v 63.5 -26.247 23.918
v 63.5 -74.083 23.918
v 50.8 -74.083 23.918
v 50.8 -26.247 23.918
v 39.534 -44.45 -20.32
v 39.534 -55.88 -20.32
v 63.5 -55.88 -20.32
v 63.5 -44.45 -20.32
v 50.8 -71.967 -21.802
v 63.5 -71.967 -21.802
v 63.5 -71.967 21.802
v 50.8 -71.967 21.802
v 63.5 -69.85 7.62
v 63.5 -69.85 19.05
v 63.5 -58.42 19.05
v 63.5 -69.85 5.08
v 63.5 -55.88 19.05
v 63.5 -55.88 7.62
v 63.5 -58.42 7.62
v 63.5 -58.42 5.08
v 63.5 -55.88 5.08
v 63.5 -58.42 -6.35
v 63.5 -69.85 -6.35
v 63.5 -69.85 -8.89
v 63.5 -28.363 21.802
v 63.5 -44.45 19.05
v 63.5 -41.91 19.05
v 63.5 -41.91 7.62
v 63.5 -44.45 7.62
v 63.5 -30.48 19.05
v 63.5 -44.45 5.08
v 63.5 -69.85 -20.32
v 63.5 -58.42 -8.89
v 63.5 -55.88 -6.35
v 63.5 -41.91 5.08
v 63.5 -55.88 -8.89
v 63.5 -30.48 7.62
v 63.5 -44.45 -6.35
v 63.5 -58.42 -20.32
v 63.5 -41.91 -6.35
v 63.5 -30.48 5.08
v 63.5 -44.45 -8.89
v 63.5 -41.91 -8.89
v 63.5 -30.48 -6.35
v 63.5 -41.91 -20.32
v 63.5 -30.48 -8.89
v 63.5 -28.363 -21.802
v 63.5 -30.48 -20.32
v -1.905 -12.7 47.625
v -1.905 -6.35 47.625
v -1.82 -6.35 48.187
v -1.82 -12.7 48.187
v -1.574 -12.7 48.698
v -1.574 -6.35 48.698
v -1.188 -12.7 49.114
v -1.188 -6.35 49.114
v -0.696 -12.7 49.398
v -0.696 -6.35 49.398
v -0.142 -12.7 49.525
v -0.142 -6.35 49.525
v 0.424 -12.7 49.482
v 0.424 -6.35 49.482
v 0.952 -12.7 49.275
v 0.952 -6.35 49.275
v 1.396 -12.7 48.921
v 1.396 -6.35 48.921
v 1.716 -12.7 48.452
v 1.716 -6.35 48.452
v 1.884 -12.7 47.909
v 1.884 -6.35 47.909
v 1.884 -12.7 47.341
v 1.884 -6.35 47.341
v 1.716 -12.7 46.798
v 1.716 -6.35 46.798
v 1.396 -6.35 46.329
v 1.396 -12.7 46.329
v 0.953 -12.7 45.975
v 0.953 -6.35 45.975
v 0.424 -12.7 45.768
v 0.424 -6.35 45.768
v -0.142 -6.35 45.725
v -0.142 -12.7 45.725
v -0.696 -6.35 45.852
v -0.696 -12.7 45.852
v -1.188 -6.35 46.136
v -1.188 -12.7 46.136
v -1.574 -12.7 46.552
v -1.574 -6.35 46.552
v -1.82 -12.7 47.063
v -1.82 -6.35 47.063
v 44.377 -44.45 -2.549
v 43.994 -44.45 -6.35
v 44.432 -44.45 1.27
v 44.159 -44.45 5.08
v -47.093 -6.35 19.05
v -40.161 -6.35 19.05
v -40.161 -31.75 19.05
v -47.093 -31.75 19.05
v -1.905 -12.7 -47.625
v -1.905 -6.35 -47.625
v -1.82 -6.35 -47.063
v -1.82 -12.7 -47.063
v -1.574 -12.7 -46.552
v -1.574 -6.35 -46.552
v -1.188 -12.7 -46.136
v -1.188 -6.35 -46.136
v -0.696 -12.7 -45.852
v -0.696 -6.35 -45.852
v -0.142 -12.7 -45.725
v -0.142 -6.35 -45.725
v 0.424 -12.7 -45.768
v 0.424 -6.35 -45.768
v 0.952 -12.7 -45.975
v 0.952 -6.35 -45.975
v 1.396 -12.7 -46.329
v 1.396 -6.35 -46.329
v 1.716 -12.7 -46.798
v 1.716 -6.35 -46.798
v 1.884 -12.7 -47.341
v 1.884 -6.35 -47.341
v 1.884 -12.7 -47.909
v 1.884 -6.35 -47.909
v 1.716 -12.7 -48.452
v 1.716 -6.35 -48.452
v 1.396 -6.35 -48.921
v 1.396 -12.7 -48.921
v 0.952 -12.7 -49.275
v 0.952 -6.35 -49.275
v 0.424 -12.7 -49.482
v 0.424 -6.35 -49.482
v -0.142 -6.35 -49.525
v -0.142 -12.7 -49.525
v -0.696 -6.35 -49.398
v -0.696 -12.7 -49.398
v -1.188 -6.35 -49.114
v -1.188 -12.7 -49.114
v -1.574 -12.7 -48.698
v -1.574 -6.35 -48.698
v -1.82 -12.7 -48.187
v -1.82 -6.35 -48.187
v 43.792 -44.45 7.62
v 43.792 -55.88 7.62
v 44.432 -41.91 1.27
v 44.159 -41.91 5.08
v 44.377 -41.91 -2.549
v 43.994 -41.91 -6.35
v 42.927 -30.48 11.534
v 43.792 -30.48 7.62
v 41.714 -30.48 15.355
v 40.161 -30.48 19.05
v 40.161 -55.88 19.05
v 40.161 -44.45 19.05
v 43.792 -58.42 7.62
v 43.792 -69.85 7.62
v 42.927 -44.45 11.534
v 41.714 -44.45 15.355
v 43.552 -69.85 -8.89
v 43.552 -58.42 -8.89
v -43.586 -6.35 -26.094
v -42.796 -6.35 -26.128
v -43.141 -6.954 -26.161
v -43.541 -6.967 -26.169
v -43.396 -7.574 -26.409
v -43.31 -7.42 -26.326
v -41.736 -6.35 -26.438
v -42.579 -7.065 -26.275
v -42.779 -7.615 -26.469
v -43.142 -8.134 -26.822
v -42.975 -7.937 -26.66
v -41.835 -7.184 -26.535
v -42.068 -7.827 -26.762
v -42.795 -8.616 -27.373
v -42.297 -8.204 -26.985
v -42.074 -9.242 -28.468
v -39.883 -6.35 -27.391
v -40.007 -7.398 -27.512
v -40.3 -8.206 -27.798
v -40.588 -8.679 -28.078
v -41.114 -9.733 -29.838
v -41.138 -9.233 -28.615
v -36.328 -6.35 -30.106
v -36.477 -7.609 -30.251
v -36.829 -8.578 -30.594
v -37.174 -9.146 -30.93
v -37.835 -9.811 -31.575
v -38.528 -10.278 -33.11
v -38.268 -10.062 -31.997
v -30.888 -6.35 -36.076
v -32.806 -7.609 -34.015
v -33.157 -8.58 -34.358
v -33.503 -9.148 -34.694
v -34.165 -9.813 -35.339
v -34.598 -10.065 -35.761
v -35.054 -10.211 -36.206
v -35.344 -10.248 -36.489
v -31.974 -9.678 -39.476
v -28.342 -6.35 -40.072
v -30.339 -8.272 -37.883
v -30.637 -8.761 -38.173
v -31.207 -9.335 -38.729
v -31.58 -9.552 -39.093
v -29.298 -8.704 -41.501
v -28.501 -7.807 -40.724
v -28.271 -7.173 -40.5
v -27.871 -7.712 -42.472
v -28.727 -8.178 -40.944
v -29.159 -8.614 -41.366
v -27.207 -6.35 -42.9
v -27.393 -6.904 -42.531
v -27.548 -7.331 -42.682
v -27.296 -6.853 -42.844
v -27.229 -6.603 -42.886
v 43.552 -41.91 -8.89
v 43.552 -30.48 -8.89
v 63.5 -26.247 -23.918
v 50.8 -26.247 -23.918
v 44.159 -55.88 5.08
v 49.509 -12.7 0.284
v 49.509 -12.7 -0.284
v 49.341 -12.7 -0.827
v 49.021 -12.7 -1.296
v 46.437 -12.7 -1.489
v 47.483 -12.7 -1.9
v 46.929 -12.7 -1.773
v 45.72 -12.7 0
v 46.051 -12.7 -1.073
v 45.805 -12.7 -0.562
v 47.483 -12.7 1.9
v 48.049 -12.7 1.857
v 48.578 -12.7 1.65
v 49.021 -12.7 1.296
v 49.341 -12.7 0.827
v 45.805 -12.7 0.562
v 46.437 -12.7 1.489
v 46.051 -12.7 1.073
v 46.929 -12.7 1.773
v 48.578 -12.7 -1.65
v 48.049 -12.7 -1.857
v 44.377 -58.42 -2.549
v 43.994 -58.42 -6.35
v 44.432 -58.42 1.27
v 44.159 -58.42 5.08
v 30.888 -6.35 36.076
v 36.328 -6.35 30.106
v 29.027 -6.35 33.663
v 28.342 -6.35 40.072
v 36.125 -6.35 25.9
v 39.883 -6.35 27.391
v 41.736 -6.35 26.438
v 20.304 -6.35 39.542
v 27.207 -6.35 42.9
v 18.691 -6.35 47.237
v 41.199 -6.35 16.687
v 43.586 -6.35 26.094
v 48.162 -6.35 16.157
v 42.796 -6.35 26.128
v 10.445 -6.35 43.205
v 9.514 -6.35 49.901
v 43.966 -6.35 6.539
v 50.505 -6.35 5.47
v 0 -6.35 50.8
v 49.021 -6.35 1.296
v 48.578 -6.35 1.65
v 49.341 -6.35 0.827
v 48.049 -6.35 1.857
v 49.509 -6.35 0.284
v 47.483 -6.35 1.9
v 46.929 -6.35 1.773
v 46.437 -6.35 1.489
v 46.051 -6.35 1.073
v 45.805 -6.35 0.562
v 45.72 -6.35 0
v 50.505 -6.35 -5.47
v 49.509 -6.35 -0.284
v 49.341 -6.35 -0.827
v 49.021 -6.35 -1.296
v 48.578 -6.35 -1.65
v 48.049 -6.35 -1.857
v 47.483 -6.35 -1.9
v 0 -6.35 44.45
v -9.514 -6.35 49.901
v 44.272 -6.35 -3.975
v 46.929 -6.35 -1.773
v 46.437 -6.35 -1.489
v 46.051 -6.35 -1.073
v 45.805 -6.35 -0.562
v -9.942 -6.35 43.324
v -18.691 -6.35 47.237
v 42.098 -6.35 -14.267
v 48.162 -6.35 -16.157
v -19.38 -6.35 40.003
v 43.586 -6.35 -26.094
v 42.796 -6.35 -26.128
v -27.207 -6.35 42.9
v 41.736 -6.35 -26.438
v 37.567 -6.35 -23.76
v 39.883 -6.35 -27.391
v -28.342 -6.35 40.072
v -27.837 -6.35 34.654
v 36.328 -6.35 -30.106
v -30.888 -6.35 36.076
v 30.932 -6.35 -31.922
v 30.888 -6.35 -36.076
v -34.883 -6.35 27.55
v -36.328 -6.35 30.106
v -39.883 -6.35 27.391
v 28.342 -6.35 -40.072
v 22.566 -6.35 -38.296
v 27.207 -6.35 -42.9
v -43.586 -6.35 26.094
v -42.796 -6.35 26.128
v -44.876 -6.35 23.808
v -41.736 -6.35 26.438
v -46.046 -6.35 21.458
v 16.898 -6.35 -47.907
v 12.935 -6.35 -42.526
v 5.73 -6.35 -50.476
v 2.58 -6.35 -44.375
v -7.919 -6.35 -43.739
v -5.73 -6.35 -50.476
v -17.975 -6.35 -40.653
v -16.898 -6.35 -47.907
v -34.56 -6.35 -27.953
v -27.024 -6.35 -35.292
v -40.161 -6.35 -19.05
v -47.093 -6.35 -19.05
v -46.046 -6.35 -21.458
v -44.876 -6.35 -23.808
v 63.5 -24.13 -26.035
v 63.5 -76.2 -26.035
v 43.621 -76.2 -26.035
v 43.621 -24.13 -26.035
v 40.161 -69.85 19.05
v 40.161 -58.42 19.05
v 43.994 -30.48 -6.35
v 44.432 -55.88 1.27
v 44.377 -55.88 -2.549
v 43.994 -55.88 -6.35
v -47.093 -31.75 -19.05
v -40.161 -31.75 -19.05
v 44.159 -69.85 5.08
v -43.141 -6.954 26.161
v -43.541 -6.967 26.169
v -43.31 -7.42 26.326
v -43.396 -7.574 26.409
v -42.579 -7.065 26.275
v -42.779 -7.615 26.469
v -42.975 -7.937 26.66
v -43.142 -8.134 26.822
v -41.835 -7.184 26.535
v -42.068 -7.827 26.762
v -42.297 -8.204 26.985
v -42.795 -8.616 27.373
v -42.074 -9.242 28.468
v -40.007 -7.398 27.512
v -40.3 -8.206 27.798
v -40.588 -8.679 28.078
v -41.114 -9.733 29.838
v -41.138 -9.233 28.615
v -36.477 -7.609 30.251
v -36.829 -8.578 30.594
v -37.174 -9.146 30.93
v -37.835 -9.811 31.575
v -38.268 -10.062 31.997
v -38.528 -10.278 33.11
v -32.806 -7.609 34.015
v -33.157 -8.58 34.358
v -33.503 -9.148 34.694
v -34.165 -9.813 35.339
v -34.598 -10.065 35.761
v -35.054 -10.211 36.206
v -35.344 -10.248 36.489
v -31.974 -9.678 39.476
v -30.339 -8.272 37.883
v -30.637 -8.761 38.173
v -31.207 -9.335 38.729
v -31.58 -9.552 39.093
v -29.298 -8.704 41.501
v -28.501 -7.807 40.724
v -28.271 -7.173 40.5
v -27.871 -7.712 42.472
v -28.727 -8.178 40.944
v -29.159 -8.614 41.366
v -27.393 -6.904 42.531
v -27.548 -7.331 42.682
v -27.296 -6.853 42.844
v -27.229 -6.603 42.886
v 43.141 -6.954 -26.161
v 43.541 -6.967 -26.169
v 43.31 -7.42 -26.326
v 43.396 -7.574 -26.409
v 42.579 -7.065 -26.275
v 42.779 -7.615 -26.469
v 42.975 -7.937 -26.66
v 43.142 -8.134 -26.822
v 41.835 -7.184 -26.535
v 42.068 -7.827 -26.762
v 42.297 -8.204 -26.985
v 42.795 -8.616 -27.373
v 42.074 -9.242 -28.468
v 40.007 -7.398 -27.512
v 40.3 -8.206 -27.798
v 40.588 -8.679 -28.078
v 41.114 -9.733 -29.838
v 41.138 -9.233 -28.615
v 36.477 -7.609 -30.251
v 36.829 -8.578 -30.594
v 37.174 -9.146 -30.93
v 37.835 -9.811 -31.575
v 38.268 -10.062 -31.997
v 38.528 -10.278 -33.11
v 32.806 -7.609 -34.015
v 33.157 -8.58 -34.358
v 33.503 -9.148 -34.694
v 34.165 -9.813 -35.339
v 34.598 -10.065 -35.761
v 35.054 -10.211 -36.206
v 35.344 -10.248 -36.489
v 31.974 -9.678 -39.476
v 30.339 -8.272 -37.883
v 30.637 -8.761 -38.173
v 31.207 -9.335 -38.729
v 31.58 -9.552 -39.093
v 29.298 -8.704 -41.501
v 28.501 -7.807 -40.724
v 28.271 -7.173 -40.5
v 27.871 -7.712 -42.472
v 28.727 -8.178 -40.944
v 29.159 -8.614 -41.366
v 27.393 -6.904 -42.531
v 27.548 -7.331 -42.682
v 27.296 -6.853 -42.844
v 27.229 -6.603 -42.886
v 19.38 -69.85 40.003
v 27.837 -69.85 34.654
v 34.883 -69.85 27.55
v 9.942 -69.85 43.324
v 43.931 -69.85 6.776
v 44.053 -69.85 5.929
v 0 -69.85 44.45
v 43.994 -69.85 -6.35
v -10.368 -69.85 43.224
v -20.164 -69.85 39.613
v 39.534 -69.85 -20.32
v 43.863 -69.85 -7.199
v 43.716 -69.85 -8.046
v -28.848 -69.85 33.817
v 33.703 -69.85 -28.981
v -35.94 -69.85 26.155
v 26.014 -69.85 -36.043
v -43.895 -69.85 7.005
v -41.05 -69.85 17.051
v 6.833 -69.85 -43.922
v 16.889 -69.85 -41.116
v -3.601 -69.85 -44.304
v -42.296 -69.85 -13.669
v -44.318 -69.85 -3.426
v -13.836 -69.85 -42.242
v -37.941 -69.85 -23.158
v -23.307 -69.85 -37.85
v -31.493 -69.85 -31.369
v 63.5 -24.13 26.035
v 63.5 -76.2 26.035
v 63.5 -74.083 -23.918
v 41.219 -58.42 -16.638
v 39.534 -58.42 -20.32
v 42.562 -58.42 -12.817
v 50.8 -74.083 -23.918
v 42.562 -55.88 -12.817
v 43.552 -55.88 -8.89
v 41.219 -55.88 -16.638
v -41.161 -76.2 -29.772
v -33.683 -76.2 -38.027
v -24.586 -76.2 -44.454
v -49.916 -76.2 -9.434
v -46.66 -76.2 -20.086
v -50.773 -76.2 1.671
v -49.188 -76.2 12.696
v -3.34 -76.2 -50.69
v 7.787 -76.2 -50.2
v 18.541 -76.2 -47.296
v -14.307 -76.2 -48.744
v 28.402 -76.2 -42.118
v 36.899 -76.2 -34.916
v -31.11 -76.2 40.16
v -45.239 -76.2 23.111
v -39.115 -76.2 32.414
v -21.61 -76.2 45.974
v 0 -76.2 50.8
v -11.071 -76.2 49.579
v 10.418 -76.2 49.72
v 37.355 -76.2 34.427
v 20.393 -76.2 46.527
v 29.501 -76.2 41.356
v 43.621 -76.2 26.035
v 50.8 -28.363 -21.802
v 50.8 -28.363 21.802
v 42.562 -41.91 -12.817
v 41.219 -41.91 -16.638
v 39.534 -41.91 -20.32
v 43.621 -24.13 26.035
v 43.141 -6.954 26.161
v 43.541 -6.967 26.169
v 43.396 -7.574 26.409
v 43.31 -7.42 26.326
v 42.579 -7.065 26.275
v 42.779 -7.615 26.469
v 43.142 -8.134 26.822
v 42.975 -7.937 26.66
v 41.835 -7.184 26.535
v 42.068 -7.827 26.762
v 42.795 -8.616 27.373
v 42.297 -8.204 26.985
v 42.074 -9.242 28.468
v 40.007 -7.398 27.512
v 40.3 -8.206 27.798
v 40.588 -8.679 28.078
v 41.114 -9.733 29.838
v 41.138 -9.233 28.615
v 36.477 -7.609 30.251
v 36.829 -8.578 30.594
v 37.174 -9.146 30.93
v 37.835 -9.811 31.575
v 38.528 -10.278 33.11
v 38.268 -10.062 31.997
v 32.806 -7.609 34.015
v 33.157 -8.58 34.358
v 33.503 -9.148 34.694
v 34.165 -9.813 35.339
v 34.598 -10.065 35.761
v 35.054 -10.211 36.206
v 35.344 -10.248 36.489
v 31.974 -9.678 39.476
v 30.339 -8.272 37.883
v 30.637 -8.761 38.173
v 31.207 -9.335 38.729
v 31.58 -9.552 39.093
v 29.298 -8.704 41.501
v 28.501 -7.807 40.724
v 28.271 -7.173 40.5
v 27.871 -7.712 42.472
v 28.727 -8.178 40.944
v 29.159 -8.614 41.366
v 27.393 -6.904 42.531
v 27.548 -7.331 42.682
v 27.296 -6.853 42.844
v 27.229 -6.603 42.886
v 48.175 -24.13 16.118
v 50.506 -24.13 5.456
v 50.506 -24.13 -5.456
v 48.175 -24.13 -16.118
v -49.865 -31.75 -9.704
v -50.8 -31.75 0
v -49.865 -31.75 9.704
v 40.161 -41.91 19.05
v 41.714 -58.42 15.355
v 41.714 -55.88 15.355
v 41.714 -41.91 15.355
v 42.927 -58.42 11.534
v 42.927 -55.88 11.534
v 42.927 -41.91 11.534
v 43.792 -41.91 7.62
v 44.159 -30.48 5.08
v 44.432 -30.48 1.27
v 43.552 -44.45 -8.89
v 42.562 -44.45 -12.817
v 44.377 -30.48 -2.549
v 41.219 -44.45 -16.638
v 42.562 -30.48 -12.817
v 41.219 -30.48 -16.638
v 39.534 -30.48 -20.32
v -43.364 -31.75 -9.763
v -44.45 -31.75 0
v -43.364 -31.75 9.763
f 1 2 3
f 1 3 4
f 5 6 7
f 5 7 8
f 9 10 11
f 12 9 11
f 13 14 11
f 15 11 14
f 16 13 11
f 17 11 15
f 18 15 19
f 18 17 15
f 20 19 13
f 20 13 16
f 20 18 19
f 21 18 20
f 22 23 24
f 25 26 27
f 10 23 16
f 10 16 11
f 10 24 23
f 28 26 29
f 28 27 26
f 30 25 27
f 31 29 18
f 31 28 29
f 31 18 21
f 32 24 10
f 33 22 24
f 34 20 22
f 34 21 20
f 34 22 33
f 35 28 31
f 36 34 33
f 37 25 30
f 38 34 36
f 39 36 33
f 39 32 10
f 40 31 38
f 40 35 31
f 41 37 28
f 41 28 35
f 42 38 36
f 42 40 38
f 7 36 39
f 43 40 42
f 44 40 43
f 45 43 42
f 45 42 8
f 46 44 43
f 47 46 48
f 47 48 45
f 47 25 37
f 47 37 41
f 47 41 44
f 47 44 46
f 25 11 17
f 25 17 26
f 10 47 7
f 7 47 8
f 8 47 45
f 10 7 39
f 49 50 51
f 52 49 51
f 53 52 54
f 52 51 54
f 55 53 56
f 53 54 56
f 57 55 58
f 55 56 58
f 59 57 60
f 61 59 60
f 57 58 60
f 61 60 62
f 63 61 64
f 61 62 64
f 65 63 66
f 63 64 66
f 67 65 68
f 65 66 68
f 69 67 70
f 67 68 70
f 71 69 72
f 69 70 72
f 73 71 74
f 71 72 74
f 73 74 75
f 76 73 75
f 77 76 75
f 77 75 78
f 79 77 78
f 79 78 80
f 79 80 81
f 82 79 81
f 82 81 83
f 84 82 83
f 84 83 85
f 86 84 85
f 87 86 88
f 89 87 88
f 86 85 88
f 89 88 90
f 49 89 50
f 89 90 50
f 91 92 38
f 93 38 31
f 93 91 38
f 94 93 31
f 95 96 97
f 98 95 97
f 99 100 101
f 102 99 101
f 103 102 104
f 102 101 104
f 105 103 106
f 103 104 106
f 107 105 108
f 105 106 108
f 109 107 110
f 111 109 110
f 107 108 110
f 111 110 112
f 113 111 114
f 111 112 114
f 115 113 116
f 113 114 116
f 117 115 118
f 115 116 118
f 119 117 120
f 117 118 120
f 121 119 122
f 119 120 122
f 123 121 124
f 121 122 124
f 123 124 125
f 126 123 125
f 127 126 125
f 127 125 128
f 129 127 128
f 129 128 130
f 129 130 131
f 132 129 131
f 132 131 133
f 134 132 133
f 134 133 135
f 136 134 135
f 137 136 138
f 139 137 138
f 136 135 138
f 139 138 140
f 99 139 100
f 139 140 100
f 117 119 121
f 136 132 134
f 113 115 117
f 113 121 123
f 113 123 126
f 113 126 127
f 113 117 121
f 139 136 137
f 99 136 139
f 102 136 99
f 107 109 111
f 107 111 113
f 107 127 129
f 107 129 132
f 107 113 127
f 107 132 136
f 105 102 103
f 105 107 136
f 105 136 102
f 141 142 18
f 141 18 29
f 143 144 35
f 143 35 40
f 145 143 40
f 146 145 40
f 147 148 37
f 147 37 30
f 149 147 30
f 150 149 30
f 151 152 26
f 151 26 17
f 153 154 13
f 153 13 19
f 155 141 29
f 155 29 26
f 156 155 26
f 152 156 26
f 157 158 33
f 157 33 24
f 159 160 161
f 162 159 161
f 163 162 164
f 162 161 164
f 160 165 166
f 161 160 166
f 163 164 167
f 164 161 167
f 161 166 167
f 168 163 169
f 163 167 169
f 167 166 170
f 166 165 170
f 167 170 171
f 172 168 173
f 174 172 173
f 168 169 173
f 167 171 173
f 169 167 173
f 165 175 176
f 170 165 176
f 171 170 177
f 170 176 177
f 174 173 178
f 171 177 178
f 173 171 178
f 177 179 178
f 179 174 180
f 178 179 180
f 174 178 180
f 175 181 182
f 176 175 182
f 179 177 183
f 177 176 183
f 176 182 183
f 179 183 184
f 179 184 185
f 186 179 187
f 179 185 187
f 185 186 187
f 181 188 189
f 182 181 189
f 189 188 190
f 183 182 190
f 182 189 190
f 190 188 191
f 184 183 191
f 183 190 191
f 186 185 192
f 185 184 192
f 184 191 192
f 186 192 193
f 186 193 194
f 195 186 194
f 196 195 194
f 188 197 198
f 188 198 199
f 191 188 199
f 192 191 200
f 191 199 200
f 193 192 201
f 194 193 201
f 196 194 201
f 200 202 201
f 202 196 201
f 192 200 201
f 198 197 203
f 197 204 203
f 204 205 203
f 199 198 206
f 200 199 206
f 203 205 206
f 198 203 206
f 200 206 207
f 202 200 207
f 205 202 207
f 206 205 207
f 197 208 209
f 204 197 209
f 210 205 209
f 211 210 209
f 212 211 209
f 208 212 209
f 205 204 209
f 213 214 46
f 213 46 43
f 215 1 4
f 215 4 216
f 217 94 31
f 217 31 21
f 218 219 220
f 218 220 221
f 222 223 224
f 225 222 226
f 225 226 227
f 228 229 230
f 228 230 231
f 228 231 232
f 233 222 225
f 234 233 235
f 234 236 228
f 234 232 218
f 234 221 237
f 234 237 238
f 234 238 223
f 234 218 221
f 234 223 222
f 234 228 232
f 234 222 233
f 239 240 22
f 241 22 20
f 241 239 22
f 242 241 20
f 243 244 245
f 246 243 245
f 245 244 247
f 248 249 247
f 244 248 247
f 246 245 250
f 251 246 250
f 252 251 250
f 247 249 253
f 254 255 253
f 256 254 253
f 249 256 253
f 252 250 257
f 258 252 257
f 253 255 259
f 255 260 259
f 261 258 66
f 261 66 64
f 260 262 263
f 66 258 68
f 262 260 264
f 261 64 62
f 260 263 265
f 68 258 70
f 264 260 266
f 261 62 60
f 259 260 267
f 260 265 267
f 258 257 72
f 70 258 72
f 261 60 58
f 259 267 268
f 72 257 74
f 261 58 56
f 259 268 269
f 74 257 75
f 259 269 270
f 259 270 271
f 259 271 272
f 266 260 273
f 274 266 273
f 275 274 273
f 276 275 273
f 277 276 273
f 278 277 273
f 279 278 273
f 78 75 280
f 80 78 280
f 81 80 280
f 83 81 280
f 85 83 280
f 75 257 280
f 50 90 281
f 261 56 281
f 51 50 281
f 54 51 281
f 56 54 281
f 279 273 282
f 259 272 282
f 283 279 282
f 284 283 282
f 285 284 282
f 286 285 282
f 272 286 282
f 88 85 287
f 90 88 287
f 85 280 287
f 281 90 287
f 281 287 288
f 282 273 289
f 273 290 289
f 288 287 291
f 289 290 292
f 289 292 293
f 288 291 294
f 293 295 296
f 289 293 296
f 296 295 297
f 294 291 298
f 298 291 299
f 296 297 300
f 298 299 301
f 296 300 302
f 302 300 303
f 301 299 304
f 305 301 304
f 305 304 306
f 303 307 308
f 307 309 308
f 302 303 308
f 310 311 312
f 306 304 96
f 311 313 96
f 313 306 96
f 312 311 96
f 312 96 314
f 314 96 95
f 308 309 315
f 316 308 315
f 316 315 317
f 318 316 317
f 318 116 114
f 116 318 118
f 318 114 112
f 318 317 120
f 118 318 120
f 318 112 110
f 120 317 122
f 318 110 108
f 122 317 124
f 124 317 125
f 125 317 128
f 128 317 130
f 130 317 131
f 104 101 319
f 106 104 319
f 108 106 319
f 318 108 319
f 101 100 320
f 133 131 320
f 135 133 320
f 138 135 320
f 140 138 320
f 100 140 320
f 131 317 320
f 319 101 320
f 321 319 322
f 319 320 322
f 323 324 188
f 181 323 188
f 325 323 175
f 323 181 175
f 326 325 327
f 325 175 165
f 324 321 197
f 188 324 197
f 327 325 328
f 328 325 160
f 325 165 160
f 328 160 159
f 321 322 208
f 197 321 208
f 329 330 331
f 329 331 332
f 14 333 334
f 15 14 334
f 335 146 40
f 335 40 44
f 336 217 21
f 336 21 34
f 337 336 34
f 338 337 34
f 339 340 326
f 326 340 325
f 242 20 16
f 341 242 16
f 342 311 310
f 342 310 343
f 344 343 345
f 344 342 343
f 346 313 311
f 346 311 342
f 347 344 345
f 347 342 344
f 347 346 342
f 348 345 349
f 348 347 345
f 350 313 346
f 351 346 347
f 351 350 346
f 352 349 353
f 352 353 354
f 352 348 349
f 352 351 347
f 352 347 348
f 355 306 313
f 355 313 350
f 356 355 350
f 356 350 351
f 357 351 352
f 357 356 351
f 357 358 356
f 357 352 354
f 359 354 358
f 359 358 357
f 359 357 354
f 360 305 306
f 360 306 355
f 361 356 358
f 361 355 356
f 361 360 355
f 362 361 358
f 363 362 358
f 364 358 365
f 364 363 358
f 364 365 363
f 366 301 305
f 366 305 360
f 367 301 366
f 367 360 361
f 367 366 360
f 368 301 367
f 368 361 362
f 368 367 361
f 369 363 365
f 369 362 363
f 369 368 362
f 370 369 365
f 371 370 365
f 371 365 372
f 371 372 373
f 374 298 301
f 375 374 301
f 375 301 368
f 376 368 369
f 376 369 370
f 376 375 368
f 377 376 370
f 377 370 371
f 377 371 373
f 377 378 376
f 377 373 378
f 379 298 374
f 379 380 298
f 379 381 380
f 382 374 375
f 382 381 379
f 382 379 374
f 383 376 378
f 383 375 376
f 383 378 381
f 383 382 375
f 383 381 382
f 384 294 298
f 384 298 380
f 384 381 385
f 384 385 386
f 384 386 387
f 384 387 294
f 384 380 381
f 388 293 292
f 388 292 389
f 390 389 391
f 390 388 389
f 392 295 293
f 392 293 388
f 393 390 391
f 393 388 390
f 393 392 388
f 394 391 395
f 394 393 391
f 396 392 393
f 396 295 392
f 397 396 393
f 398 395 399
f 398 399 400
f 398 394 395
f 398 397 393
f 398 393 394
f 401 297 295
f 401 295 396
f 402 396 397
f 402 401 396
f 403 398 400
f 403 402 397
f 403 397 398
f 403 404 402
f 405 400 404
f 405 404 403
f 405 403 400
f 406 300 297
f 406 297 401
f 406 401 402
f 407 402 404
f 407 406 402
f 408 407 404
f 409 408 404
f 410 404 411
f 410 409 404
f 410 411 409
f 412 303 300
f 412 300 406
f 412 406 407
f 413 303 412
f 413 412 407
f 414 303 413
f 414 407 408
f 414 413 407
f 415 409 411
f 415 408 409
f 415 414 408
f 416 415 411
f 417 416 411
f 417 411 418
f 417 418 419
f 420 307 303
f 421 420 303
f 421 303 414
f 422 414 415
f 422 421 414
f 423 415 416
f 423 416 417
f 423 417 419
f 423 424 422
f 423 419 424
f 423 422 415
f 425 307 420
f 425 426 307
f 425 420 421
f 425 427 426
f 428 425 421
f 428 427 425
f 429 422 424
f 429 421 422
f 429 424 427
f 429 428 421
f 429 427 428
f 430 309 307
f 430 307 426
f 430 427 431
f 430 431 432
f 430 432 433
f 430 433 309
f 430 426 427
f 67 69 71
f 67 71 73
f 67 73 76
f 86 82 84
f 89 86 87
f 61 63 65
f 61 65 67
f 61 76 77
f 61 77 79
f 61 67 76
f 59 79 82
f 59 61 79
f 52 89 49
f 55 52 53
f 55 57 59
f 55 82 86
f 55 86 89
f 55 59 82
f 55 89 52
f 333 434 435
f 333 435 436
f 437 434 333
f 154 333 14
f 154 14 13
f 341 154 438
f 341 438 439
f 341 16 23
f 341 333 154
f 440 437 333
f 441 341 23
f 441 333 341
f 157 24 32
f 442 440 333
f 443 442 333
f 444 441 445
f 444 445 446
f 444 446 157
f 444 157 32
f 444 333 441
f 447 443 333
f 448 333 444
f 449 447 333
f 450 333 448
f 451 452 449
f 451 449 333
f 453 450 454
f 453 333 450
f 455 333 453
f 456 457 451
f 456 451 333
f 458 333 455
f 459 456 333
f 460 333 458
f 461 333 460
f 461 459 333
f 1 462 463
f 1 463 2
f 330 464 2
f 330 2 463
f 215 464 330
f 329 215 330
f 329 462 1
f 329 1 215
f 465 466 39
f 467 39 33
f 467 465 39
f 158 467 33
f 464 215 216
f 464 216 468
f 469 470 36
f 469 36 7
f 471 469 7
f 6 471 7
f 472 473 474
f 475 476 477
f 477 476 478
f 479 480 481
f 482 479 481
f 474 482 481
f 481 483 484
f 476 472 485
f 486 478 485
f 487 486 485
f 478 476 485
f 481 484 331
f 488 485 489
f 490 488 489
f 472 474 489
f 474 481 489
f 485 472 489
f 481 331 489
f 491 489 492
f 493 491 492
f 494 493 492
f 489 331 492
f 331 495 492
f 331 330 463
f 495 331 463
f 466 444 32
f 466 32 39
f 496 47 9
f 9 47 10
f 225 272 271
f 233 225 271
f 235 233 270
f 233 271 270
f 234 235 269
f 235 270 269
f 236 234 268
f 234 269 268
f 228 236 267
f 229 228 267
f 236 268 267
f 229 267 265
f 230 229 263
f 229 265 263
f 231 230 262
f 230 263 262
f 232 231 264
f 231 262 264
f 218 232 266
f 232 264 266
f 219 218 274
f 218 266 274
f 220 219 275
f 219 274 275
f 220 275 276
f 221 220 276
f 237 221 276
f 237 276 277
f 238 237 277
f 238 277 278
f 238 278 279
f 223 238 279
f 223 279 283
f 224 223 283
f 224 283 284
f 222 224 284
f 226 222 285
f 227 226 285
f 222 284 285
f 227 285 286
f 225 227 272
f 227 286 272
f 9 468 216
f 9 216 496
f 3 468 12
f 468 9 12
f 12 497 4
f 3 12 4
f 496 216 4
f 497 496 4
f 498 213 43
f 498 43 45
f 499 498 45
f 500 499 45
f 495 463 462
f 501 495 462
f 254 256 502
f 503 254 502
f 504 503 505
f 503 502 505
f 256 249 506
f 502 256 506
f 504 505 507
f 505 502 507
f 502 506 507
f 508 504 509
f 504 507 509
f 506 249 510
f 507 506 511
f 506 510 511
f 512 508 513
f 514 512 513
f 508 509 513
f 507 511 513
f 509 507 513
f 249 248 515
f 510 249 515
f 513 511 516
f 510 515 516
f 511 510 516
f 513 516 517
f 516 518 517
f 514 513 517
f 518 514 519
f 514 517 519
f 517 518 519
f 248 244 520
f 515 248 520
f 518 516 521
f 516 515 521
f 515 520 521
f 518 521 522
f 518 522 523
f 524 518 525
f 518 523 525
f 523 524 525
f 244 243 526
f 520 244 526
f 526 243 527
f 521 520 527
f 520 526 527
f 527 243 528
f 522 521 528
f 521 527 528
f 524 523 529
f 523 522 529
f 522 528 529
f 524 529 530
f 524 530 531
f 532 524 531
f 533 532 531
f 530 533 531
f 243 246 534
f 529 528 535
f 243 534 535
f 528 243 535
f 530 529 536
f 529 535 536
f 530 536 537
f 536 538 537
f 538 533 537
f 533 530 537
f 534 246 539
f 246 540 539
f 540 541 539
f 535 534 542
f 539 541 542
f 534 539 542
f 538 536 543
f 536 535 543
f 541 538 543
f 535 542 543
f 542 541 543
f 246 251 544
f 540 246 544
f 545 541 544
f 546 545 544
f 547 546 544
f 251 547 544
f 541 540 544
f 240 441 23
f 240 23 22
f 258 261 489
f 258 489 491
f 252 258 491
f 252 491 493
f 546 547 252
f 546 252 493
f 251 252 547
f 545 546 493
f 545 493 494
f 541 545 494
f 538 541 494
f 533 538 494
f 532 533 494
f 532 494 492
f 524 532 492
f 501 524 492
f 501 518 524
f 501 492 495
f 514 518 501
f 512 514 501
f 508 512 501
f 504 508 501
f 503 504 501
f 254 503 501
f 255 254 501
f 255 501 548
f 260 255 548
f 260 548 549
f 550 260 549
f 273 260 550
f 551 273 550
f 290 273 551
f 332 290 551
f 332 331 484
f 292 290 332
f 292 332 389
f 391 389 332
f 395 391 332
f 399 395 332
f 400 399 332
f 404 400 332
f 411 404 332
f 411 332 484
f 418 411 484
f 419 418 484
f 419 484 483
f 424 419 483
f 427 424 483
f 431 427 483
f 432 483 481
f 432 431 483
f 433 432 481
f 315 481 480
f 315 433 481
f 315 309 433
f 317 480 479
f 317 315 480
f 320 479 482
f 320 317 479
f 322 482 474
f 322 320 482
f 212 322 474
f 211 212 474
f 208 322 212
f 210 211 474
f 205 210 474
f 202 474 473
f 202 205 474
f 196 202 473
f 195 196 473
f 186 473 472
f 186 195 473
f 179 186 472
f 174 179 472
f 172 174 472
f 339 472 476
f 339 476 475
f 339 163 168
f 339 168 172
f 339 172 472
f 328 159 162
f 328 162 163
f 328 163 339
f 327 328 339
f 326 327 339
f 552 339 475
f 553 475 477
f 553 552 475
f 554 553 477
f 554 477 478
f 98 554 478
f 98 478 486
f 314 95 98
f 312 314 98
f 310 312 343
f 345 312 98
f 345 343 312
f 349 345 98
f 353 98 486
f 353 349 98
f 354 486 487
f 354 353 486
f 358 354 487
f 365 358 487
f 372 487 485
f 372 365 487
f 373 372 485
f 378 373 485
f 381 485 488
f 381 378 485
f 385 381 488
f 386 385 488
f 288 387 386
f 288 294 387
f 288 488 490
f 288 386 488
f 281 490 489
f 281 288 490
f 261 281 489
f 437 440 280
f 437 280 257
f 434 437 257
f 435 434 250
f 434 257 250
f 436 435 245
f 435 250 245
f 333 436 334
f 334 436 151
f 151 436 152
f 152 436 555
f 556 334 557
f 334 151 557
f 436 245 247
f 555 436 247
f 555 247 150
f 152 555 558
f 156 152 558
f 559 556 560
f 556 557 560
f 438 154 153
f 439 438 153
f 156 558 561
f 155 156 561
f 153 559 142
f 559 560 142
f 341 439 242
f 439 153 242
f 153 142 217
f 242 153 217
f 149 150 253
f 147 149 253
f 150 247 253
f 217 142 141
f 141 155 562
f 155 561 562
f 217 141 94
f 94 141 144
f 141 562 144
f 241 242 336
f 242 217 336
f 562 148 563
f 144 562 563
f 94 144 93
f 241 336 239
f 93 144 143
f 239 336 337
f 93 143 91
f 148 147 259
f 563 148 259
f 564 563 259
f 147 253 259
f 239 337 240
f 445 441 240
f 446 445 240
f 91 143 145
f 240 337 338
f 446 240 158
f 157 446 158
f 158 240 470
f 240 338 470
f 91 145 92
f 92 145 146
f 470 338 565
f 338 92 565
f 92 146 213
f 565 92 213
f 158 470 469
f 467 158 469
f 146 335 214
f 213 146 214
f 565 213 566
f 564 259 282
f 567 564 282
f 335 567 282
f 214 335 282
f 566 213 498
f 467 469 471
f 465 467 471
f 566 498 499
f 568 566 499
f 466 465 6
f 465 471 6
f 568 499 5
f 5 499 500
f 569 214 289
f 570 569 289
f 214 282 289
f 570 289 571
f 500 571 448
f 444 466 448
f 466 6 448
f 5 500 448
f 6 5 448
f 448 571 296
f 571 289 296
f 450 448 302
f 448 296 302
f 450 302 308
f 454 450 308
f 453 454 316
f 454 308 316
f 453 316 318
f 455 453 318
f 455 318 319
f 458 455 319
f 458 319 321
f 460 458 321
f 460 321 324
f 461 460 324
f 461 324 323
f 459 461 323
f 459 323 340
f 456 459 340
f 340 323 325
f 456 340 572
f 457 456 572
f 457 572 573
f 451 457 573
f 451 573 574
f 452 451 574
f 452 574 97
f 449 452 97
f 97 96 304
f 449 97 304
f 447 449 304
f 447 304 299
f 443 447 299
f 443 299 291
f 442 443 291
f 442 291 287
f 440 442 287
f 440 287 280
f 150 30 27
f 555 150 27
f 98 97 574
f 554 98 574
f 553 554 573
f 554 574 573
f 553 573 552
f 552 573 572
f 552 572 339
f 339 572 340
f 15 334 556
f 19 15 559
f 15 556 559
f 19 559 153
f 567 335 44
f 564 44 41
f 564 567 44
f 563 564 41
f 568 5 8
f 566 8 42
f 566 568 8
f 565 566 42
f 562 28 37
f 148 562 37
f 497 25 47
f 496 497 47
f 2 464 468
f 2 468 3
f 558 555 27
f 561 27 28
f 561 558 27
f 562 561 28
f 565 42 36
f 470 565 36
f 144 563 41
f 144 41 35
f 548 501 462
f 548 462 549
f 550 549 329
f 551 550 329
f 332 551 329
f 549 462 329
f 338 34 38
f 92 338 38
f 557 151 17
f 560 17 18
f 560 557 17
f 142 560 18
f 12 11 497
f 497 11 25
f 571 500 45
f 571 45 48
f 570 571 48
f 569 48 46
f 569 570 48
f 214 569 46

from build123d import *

# Parameters (mm, degrees)
SKETCH2_R                = 50.8
BOSS_EXTRUDE1_DEPTH      = 76.2
CUT_EXTRUDE4_START       = -6.35
SKETCH5_R                = 44.449999999999996
CUT_EXTRUDE4_DEPTH       = 63.5
CUT_EXTRUDE6_REACH       = 106.727
SKETCH14_R               = 7.62
BOSS_EXTRUDE4_REACH      = 170.227
BOSS_EXTRUDE4_END_RADIUS = 50.8
BOSS_EXTRUDE4_START      = 63.5
SKETCH17_W               = 52.06999999999999
SKETCH17_H               = 52.06999999999999
SKETCH15_W               = 11.430000000000003
SKETCH15_H               = 11.430000000000021
CUT_EXTRUDE7_DEPTH       = 112.44204771987995
CUT_EXTRUDE9_DEPTH       = 12.7
CUT_EXTRUDE10_DEPTH      = 112.44204771987995
CUT_EXTRUDE10_DEPTH_BACK = 112.44204771987995
SKETCH22_R               = 1.9049999999999998
SKETCH22_R_2             = 1.905
CUT_EXTRUDE11_DEPTH      = 6.35
CUT_EXTRUDE12_REACH      = 113.442
CUT_EXTRUDE12_END_RADIUS = 50.8


with BuildPart() as part:
    # Sketch2 → Boss-Extrude1 (new body)
    with BuildSketch(Plane(origin=(0, 0, 0), x_dir=(1, 0, 0), z_dir=(0, 1, 0))):
        with Locations(Location((0, 0, 0), (0, 0, 270))):
            Circle(SKETCH2_R)
    extrude(amount=-BOSS_EXTRUDE1_DEPTH)

    # Sketch5 → Cut-Extrude4 (cut)
    with BuildSketch(Plane(origin=(0, 0, 0), x_dir=(1, 0, 0), z_dir=(0, 1, 0)).offset(CUT_EXTRUDE4_START)):
        with Locations(Location((0, 0, 0), (0, 0, 270))):
            Circle(SKETCH5_R)
    extrude(amount=-CUT_EXTRUDE4_DEPTH, mode=Mode.SUBTRACT)

    # Sketch14 → Cut-Extrude6 (cut, up to next)
    with BuildSketch(Plane(origin=(0, 0, 0), x_dir=(1, 0, 0), z_dir=(0, 1, 0)), mode=Mode.PRIVATE) as cut_extrude6_sk1:
        with Locations(Location((0, 0, 0), (0, 0, 270))):
            Circle(SKETCH14_R)
    cut_extrude6_tool1 = extrude(cut_extrude6_sk1.sketch, amount=-CUT_EXTRUDE6_REACH, mode=Mode.PRIVATE) & part.part
    add(cut_extrude6_tool1.solids().sort_by_distance((0, 0, 0))[0], mode=Mode.SUBTRACT)

    # Boss-Extrude4: up to this cylinder (the profile starts outside it)
    boss_extrude4_end = Plane(origin=(0, -50.165, 0), z_dir=(0, 1, 0)) * Cylinder(BOSS_EXTRUDE4_END_RADIUS, 443.054, mode=Mode.PRIVATE)
    # Sketch17 → Boss-Extrude4 (add, up to the surface)
    with BuildSketch(Plane(origin=(0, 0, 0), x_dir=(0, 0, -1), z_dir=(1, 0, 0)).offset(BOSS_EXTRUDE4_START), mode=Mode.PRIVATE) as boss_extrude4_sk1:
        with Locations((0, -50.165000000000006)):
            Rectangle(SKETCH17_W, SKETCH17_H)
    boss_extrude4_tool1 = extrude(boss_extrude4_sk1.sketch, amount=-BOSS_EXTRUDE4_REACH, mode=Mode.PRIVATE) - boss_extrude4_end
    add(boss_extrude4_tool1.solids().sort_by_distance((63.5, -50.165, 0))[0])

    # Sketch15 → Cut-Extrude7 (cut, through all)
    with BuildSketch(Plane(origin=(0, 0, 0), x_dir=(0, 0, -1), z_dir=(1, 0, 0))):
        Polygon((8.890000000000002, -30.480000000000018), (8.890000000000004, -41.91000000000002), (20.320000000000007, -41.91000000000002), (20.320000000000004, -30.480000000000018), align=None)
        Polygon((8.890000000000004, -44.45000000000002), (8.890000000000004, -55.879999999999995), (20.32000000000001, -55.87999999999999), (20.320000000000004, -44.45000000000002), align=None)
        Polygon((8.890000000000004, -58.42000000000001), (8.890000000000006, -69.85000000000002), (20.320000000000007, -69.85000000000002), (20.320000000000004, -58.42000000000001), align=None)
        Polygon((-5.079999999999998, -30.480000000000018), (-5.0799999999999965, -41.91000000000002), (6.350000000000003, -41.91000000000002), (6.3500000000000005, -30.480000000000018), align=None)
        Polygon((-5.0799999999999965, -44.45000000000002), (-5.079999999999994, -55.879999999999995), (6.350000000000005, -55.879999999999995), (6.350000000000002, -44.45000000000002), align=None)
        Polygon((-5.079999999999994, -58.42000000000001), (-5.079999999999992, -69.85000000000002), (6.3500000000000085, -69.85000000000002), (6.350000000000005, -58.42000000000001), align=None)
        with Locations((-13.334999999999996, -64.13500000000002)):
            Rectangle(SKETCH15_W, SKETCH15_H)
        Polygon((-19.049999999999997, -44.45000000000002), (-19.049999999999997, -55.88), (-7.619999999999997, -55.88), (-7.620000000000001, -44.45000000000001), align=None)
        Polygon((-19.049999999999997, -30.480000000000018), (-19.049999999999997, -41.91000000000002), (-7.619999999999997, -41.91000000000002), (-7.619999999999999, -30.480000000000018), align=None)
    extrude(amount=CUT_EXTRUDE7_DEPTH, mode=Mode.SUBTRACT)

    # Sketch19 → Cut-Extrude9 (cut)
    with BuildSketch(Plane(origin=(63.5, 0, 0), x_dir=(0, 0, -1), z_dir=(1, 0, 0))):
        Polygon((-23.91833418, -26.24666582000001), (23.91833418, -26.24666582000001), (23.918334180000006, -74.08333418000001), (-23.918334179999995, -74.08333418000001), align=None)
        Polygon((-21.801668359999997, -28.36333164000001), (21.801668359999997, -28.36333164000001), (21.801668360000008, -71.96666836), (-21.80166835999999, -71.96666836), align=None, mode=Mode.SUBTRACT)
    extrude(amount=-CUT_EXTRUDE9_DEPTH, mode=Mode.SUBTRACT)

    # Sketch21 → Cut-Extrude10 (cut, two sides: drawn at the far end of the back side and taken through both)
    with BuildSketch(Plane.XY.offset(-CUT_EXTRUDE10_DEPTH_BACK)):
        Polygon((-50.8, -5.551e-14), (50.8, -5.551e-14), (50.8, -6.350000000000057), (-50.8, -6.350000000000056), align=None)
    extrude(amount=CUT_EXTRUDE10_DEPTH + CUT_EXTRUDE10_DEPTH_BACK, mode=Mode.SUBTRACT)

    # Sketch22 → Cut-Extrude11 (cut)
    with BuildSketch(Plane(origin=(-1.1e-16, -6.3500000000000565, 0), x_dir=(1, -2e-17, 0), z_dir=(2e-17, 1, 0))):
        with Locations(Location((-47.625, 0, 0), (0, 0, 180))):
            Circle(SKETCH22_R)
        with Locations(Location((-3.47e-15, 47.625, 0), (0, 0, 180))):
            Circle(SKETCH22_R_2)
        with Locations(Location((47.625, -2e-17, 0), (0, 0, 180))):
            Circle(SKETCH22_R)
        with Locations(Location((0, -47.625, 0), (0, 0, 180))):
            Circle(SKETCH22_R)
    extrude(amount=-CUT_EXTRUDE11_DEPTH, mode=Mode.SUBTRACT)

    # Sketch23 → Cut-Revolve2 (revolve, cut)
    with BuildSketch(Plane(origin=(-1.1e-16, -6.3500000000000565, 0), x_dir=(1, -2e-17, 0), z_dir=(2e-17, 1, 0))):
        with BuildLine():
            ThreePointArc((-35.92102448427656, 35.92102448427667), (-40.05586016064811, 31.243688431275256), (-43.58574874724786, 26.094491873607765))
            add(Edge.make_bspline(
                [(-43.58574874724785, 26.09449187360776), (-31.762489950913196, 24.642390713165252), (-27.206529454407143, 42.90040506855935)],
                knots=[0.20326690102876438, 0.20326690102876438, 0.20326690102876438, 2.6184475567908634, 2.6184475567908634, 2.6184475567908634], degree=2, weights=[1, 0.3552729019239298, 1]))
            ThreePointArc((-27.206529454407157, 42.90040506855938), (-31.756101065864836, 39.650851757491644), (-35.92102448427656, 35.921024484276664))
        make_face()
    cut_revolve2 = revolve(axis=Axis((-44.65936804956108, -6.350000000000056, -27.140852507845565), (0.6979571200610449, 0, -0.7161395524310135)), mode=Mode.SUBTRACT)

    # Mirror1: Cut-Revolve2 across plane
    add(cut_revolve2.mirror(Plane.XY), mode=Mode.SUBTRACT)

    # Mirror2: Cut-Revolve2 across plane
    add(cut_revolve2.mirror(Plane(origin=(0, 0, 0), x_dir=(0, 0, 1), z_dir=(1, 0, 0))), mode=Mode.SUBTRACT)

    # Mirror2 copy 1 sketch → Mirror2 copy 1 (revolve, cut)
    with BuildSketch(Plane(origin=(1.1e-16, -6.3500000000000565, 0), x_dir=(-1, -2e-17, 0), z_dir=(-2e-17, 1, 0))):
        with BuildLine():
            ThreePointArc((-35.92102448427656, 35.92102448427667), (-40.05586016064811, 31.243688431275256), (-43.58574874724786, 26.094491873607765))
            add(Edge.make_bspline(
                [(-43.58574874724785, 26.09449187360776), (-31.762489950913196, 24.642390713165252), (-27.206529454407143, 42.90040506855935)],
                knots=[0.20326690102876438, 0.20326690102876438, 0.20326690102876438, 2.6184475567908634, 2.6184475567908634, 2.6184475567908634], degree=2, weights=[1, 0.3552729019239298, 1]))
            ThreePointArc((-27.206529454407157, 42.90040506855938), (-31.756101065864836, 39.650851757491644), (-35.92102448427656, 35.921024484276664))
        make_face()
    revolve(axis=Axis((44.65936804956108, -6.350000000000056, 27.140852507845565), (-0.6979571200610449, 0, 0.7161395524310135)), mode=Mode.SUBTRACT)

    # Cut-Extrude12: up to this cylinder (the profile starts inside it)
    cut_extrude12_end = Plane(origin=(0, -19.049999999999997, 0), z_dir=(0, 1, 0)) * Cylinder(CUT_EXTRUDE12_END_RADIUS, 329.484, mode=Mode.PRIVATE)
    # Sketch24 → Cut-Extrude12 (cut, up to the surface)
    with BuildSketch(Plane(origin=(0, 0, 0), x_dir=(0, 0, -1), z_dir=(1, 0, 0)), mode=Mode.PRIVATE) as cut_extrude12_sk1:
        Polygon((19.05, -6.350000000000049), (-19.050000000000004, -6.350000000000054), (-19.05, -31.750000000000064), (19.050000000000008, -31.75000000000005), align=None)
    cut_extrude12_tool1 = extrude(cut_extrude12_sk1.sketch, amount=-CUT_EXTRUDE12_REACH, mode=Mode.PRIVATE) & cut_extrude12_end
    add(cut_extrude12_tool1.solids().sort_by_distance((0, -19.05, 0))[0], mode=Mode.SUBTRACT)


solid = part.part
